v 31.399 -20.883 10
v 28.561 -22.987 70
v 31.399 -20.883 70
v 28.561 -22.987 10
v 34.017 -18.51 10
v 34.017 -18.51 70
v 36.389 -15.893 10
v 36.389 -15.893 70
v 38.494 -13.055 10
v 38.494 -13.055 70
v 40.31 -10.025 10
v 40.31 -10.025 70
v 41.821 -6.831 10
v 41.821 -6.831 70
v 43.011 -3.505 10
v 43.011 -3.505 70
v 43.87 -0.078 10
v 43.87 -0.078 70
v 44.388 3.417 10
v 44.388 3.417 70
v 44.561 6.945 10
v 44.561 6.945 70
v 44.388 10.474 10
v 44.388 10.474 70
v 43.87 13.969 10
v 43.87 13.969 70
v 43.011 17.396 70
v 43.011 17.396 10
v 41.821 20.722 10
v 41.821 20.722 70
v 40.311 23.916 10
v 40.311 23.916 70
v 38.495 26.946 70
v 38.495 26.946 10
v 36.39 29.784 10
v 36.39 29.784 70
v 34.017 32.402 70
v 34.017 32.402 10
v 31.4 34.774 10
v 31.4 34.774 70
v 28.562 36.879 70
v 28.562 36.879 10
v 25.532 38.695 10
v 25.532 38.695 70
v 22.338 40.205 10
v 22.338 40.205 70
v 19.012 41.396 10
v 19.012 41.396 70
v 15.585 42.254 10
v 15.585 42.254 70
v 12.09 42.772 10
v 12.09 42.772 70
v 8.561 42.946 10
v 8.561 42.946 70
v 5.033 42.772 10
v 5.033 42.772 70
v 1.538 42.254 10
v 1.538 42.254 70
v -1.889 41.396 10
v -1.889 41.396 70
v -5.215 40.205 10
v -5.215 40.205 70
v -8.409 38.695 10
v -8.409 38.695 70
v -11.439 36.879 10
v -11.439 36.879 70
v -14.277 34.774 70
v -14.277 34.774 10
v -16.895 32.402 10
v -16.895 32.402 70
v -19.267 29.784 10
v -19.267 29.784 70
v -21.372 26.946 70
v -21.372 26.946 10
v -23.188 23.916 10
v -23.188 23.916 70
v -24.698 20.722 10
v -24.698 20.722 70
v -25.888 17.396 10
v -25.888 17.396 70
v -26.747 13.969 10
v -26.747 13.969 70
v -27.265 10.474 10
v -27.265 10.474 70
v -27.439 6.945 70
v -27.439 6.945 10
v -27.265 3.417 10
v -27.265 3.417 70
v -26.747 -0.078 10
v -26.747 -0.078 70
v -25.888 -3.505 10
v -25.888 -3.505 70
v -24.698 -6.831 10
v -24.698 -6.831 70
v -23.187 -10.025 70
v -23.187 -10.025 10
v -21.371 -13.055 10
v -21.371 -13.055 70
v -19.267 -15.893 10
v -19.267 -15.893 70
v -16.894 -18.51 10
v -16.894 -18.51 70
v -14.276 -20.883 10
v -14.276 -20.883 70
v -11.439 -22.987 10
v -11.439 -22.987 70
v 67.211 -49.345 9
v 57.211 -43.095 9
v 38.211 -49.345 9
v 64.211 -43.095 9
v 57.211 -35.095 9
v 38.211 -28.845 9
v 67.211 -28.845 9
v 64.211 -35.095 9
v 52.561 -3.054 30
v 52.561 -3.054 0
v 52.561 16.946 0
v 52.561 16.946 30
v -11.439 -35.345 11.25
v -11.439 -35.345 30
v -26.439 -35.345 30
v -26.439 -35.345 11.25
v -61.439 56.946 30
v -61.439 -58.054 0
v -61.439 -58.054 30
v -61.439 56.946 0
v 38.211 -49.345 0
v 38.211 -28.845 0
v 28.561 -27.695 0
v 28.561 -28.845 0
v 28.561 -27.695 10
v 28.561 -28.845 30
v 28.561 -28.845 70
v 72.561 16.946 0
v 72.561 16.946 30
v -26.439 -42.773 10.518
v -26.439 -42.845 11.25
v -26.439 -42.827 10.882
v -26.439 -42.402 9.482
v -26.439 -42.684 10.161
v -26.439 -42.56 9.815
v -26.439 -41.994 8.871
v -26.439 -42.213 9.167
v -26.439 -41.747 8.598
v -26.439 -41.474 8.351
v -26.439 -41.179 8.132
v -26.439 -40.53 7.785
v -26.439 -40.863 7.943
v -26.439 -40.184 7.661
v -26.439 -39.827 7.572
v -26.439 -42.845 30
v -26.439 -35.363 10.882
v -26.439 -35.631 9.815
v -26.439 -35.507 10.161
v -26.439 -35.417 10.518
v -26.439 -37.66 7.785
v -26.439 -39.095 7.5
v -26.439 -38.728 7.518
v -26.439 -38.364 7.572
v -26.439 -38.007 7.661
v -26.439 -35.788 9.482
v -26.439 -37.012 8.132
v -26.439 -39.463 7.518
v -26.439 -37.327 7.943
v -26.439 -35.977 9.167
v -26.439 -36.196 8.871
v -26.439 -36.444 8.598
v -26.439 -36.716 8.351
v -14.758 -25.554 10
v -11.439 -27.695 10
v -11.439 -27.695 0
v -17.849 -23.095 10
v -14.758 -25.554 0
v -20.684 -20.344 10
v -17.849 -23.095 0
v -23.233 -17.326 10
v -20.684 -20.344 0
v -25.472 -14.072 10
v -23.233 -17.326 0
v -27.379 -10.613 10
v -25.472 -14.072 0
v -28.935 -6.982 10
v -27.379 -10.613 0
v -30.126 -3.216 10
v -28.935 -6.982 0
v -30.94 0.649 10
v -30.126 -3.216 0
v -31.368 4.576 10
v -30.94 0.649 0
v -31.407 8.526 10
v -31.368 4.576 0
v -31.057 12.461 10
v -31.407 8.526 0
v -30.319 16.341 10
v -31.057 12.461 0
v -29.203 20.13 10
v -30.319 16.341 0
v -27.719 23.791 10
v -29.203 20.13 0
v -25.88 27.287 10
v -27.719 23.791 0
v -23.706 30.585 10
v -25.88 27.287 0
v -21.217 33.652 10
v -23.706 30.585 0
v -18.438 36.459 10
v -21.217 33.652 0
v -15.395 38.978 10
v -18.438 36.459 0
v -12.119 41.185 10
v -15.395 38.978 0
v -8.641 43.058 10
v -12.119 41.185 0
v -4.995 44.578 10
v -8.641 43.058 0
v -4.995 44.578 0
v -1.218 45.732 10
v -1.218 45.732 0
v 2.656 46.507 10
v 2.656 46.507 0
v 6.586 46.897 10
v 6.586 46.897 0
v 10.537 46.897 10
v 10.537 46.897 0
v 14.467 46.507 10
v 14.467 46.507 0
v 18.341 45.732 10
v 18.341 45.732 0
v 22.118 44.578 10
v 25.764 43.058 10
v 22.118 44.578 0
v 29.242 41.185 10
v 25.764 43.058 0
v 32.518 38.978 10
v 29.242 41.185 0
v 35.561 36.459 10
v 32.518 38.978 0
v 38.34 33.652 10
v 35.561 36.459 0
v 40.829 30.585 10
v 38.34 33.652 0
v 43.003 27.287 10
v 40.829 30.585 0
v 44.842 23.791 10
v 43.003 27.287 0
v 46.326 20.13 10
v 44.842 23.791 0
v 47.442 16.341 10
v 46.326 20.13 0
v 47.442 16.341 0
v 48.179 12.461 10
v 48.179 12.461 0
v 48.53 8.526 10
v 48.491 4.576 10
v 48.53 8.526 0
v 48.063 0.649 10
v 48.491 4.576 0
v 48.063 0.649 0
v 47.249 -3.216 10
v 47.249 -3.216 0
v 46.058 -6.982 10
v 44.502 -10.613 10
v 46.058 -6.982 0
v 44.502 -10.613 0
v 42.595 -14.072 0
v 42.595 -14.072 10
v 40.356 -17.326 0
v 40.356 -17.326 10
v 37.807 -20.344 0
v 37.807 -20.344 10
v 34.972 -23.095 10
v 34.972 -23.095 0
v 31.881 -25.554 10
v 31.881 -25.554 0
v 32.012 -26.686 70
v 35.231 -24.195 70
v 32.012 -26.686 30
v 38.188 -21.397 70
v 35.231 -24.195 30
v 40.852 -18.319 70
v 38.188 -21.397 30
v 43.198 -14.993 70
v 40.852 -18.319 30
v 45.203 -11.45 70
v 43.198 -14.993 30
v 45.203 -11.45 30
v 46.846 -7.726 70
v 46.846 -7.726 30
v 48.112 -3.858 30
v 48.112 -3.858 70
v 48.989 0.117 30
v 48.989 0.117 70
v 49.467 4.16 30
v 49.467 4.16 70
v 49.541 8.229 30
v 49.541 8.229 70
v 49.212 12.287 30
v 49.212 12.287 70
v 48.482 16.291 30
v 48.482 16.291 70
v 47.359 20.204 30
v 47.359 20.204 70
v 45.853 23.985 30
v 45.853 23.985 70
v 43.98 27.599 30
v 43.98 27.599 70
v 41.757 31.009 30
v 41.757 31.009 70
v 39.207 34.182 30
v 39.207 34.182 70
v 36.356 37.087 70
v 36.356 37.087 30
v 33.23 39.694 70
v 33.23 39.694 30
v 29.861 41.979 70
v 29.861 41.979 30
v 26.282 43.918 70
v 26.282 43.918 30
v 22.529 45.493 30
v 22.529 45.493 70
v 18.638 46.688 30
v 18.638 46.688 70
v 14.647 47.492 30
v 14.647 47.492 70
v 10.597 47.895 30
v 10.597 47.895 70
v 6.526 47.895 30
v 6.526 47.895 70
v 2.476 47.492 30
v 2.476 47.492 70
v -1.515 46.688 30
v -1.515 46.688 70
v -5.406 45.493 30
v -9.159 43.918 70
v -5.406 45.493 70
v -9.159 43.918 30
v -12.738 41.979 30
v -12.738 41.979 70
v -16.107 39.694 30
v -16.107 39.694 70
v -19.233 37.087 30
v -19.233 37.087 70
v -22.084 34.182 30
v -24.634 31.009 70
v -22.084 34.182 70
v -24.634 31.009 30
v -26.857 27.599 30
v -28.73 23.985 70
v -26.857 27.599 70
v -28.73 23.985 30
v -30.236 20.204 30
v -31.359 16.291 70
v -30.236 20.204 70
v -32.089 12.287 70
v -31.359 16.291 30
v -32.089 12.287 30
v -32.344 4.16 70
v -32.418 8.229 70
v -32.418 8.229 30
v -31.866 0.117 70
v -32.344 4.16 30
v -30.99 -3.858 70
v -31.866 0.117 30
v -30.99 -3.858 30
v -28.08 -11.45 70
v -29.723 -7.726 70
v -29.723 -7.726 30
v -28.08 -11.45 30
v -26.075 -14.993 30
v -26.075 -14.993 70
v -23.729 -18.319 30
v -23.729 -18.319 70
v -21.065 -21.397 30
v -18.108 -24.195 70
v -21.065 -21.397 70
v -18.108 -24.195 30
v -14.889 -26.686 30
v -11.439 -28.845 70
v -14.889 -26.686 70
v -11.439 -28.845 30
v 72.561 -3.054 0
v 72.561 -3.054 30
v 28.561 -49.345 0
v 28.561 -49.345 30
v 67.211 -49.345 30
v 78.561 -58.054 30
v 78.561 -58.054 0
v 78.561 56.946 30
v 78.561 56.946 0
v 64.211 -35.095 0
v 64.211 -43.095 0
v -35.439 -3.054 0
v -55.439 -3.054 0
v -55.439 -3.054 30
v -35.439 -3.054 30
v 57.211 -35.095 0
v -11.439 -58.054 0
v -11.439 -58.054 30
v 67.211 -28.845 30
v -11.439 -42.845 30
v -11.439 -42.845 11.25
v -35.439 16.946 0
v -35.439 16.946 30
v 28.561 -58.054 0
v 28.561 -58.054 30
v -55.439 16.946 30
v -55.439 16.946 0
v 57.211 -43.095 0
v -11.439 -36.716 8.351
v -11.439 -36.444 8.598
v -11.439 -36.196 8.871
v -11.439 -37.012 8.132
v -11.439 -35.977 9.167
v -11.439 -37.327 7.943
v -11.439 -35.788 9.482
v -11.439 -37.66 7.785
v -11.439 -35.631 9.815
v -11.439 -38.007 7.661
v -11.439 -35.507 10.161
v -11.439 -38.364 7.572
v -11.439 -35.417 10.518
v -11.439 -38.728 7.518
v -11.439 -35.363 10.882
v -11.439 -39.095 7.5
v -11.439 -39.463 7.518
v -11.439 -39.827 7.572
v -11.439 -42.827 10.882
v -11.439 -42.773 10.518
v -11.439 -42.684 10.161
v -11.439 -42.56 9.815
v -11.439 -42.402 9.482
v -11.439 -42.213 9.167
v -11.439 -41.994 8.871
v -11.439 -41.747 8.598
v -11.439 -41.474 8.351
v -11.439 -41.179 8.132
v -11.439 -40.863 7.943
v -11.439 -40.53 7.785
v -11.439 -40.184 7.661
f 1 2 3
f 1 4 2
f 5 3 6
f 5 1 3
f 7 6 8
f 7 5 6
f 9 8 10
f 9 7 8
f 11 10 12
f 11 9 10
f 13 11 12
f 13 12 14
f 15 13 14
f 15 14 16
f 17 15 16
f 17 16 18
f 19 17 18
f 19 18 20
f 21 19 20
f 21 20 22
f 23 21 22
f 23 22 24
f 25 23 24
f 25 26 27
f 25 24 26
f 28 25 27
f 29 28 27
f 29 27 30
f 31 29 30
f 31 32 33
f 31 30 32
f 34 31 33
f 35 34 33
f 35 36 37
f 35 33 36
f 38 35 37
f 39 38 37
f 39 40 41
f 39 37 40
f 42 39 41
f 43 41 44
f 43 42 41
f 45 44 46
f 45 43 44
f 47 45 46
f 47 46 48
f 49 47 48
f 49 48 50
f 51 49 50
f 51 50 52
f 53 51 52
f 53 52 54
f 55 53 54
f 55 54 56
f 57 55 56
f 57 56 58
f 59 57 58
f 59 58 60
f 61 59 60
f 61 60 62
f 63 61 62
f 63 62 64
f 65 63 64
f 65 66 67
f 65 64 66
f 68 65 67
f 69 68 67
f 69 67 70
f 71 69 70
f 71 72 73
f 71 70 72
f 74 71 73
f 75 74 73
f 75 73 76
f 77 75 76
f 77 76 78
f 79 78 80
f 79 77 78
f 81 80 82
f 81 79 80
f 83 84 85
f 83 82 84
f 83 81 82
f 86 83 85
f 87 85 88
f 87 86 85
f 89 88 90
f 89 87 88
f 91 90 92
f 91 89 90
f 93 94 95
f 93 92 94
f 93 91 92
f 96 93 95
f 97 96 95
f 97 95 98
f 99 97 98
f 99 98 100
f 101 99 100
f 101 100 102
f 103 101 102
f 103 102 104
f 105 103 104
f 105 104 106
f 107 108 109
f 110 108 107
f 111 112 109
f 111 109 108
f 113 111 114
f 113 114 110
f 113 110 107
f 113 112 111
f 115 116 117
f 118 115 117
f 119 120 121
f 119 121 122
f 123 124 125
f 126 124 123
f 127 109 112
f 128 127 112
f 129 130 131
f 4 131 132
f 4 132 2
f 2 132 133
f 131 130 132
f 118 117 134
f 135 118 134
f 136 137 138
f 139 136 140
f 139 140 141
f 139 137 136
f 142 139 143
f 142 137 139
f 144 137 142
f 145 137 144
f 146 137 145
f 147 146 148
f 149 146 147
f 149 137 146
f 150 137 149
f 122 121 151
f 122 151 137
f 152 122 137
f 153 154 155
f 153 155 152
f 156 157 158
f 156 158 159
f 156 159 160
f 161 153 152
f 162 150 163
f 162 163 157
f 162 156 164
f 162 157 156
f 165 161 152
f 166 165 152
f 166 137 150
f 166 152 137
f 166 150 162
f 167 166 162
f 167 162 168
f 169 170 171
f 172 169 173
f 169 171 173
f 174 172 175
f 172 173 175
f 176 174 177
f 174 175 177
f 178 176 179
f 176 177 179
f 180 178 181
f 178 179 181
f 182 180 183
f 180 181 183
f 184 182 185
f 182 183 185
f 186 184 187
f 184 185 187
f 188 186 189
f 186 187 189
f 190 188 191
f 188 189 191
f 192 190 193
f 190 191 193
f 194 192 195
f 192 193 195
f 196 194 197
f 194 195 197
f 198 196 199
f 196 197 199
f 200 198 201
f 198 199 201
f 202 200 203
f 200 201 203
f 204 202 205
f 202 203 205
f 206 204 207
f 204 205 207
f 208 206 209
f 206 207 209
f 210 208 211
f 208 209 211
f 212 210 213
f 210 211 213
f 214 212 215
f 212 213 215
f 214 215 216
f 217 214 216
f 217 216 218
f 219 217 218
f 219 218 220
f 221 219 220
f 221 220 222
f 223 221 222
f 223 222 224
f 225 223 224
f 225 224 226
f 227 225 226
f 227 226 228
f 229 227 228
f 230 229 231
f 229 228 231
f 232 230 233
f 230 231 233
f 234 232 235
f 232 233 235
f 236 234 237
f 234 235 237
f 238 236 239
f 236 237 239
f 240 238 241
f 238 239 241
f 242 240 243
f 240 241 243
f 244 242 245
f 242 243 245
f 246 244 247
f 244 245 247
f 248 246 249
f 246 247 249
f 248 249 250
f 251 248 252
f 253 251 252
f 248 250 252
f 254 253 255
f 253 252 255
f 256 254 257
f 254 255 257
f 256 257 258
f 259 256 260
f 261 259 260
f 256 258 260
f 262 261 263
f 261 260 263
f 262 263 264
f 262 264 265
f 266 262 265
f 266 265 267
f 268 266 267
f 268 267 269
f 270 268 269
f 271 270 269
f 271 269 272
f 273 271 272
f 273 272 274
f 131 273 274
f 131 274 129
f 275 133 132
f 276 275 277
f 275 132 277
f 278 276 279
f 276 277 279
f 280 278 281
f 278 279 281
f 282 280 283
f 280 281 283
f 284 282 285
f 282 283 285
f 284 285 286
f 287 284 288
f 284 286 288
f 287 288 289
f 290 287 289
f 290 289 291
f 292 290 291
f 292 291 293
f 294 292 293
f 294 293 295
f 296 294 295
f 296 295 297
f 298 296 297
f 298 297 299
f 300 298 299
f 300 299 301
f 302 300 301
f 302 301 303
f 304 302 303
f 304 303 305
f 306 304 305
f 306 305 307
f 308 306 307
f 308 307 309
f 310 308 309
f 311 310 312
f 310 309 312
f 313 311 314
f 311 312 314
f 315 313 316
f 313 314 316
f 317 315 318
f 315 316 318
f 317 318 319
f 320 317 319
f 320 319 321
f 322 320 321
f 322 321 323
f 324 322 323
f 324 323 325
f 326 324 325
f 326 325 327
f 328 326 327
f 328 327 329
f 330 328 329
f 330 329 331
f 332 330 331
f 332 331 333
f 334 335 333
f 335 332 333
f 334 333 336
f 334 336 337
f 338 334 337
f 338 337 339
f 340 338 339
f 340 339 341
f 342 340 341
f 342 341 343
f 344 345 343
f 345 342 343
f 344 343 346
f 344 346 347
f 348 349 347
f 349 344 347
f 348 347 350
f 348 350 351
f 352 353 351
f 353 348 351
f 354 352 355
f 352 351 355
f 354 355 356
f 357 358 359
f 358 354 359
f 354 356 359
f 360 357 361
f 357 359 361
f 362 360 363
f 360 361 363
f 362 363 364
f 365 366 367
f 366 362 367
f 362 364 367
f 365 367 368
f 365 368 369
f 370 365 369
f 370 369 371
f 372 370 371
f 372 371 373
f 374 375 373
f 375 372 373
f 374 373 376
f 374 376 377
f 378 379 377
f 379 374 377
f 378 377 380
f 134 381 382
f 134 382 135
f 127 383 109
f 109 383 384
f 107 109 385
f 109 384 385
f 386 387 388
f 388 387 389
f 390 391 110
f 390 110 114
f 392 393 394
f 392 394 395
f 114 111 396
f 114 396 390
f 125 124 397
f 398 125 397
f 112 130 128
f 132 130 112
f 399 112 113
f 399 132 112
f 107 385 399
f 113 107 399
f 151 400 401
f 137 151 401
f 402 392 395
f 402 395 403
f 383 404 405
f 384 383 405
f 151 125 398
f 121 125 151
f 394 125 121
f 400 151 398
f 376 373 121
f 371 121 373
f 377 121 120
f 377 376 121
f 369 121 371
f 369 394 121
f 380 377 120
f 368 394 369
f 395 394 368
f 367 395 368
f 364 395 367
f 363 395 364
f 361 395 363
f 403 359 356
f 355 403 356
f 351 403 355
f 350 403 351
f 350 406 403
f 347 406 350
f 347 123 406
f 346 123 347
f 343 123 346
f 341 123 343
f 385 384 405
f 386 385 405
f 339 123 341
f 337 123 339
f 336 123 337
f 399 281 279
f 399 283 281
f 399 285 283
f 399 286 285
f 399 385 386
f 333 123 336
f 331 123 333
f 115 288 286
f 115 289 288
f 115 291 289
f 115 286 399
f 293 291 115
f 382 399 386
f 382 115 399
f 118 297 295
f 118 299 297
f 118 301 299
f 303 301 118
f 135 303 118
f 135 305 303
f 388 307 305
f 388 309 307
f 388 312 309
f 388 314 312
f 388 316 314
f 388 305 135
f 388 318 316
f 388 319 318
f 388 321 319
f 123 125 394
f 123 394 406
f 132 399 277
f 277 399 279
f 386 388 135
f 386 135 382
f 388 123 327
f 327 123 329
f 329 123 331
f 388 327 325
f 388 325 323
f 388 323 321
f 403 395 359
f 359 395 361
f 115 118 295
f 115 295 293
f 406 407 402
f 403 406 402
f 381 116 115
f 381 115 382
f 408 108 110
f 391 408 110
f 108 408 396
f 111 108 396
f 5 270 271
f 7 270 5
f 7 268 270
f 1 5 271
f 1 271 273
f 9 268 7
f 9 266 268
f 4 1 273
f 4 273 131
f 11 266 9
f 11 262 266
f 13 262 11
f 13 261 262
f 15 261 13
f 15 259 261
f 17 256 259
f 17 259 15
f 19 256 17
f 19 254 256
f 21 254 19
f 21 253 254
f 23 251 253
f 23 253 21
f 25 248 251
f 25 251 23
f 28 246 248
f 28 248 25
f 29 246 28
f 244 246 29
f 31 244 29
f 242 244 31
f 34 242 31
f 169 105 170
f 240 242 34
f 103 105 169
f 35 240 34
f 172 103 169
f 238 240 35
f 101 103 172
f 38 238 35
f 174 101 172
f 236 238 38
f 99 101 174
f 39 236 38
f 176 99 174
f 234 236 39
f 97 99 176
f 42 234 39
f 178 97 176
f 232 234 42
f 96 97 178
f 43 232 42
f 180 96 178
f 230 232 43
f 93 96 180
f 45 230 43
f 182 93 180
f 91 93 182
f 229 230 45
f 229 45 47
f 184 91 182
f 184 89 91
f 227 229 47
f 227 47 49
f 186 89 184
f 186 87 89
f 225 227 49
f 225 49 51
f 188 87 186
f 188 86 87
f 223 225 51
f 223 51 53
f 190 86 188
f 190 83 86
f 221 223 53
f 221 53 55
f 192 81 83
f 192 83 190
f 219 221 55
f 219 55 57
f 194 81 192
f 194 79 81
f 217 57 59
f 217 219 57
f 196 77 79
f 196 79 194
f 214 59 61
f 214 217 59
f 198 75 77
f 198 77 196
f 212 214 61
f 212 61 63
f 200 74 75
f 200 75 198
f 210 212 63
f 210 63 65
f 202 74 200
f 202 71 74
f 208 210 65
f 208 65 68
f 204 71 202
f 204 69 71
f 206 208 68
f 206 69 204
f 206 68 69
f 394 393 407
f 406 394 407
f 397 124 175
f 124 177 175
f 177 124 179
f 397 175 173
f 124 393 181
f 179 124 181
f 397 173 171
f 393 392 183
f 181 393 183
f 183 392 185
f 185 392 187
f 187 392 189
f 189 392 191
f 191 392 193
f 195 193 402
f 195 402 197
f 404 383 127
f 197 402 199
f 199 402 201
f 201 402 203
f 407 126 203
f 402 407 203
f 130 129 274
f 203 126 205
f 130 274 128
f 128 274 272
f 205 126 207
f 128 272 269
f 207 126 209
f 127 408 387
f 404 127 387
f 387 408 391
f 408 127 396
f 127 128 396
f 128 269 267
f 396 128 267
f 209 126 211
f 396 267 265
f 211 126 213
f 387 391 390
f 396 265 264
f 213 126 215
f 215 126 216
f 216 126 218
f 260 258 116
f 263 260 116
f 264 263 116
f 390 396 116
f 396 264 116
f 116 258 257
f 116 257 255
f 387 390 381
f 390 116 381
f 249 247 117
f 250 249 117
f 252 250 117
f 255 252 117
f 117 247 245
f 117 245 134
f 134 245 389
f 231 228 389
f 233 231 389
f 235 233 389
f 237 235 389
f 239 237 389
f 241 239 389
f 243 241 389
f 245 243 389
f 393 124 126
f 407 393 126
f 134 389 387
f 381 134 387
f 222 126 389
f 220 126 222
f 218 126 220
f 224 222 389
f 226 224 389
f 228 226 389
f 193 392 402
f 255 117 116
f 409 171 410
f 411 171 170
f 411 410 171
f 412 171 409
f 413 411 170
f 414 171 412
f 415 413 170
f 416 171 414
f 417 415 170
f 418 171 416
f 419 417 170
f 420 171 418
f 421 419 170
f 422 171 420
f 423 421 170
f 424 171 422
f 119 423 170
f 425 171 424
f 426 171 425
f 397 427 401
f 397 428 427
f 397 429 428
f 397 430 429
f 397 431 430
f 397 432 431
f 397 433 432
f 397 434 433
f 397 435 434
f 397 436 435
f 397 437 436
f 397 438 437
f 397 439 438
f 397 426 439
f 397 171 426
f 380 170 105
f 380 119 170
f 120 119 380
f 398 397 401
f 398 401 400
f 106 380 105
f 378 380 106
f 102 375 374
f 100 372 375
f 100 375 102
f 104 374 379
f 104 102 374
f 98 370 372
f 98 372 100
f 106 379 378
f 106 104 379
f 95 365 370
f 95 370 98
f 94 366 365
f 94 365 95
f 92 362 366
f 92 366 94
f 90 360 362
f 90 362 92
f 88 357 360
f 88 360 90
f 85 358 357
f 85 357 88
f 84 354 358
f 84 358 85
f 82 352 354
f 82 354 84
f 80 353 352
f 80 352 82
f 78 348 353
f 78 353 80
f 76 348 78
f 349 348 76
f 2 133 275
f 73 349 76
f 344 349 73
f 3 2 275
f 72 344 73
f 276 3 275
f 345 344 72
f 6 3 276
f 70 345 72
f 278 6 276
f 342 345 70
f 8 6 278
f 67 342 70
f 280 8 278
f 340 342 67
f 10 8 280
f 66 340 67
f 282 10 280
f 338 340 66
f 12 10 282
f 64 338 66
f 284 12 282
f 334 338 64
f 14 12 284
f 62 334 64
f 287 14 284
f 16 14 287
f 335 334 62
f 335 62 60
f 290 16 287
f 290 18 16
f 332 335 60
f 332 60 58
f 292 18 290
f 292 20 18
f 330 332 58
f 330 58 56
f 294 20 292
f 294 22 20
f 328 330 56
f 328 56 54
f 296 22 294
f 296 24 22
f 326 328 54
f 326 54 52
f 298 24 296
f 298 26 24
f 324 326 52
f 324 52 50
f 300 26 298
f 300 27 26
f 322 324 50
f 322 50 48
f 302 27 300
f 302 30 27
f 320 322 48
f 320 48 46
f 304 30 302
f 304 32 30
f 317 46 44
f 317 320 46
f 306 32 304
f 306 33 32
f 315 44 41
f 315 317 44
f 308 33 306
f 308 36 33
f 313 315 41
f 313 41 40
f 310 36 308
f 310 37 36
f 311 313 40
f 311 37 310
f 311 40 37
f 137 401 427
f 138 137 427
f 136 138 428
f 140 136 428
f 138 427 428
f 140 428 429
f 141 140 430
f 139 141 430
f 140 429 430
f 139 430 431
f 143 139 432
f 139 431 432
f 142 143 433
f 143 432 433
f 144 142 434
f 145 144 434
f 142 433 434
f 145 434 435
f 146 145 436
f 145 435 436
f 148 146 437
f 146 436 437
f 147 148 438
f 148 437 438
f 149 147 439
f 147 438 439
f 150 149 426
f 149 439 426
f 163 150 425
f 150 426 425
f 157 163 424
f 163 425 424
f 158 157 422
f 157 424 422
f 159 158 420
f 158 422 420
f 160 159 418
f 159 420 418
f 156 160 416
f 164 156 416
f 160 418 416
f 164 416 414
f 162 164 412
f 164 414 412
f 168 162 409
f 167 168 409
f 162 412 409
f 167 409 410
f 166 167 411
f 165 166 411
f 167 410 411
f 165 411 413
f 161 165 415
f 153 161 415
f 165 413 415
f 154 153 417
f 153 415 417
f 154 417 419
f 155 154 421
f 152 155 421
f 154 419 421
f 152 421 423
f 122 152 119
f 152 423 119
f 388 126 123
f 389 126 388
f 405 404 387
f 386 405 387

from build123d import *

# Parameters (mm, degrees)
SKETCH_1_W          = 140
SKETCH_1_H          = 115
SKETCH_1_R          = 36
SKETCH_1_W_2        = 20
SKETCH_1_H_2        = 20
EXTRUDE_1_DEPTH     = 30
SKETCH_2_R          = 40
CUT_EXTRUDE_1_DEPTH = 10
SKETCH_10_R         = 41
SKETCH_10_R_2       = 36
EXTRUDE_3_DEPTH     = 40
CUT_EXTRUDE_2_REACH = 117
SKETCH_3_W          = 40
SKETCH_3_H          = 80
SKETCH_4_R          = 3.75
SKETCH_4_W          = 18.75
SKETCH_4_H          = 7.5
CUT_EXTRUDE_3_DEPTH = 15
SKETCH_6_W          = 9.65
SKETCH_6_H          = 20.5
CUT_EXTRUDE_4_DEPTH = 31
SKETCH_7_W          = 29
SKETCH_7_H          = 20.5
CUT_EXTRUDE_5_DEPTH = 21
SKETCH_11_W         = 7
SKETCH_11_H         = 8
CUT_EXTRUDE_6_DEPTH = 10


with BuildPart() as part:
    # 草圖1 → 填料-伸長1 (new body)
    with BuildSketch(Plane.XY):
        with Locations((8.56146046, -0.554151625)):
            Rectangle(SKETCH_1_W, SKETCH_1_H)
        with Locations((8.56146046, 6.945848375)):
            Circle(SKETCH_1_R, mode=Mode.SUBTRACT)
        with Locations((-45.43853954, 6.945848375)):
            Rectangle(SKETCH_1_W_2, SKETCH_1_H_2, mode=Mode.SUBTRACT)
        with Locations((62.56146046, 6.945848375)):
            Rectangle(SKETCH_1_W_2, SKETCH_1_H_2, mode=Mode.SUBTRACT)
    extrude(amount=EXTRUDE_1_DEPTH)

    # 草圖2 → 除料-伸長1 (cut)
    with BuildSketch(Plane(origin=(0, 0, 0), x_dir=(-1, 0, 0), z_dir=(0, 0, -1))):
        with Locations((-8.56146046, 6.945848375)):
            Circle(SKETCH_2_R)
    extrude(amount=-CUT_EXTRUDE_1_DEPTH, mode=Mode.SUBTRACT)

    # 草圖10 → 填料-伸長3 (add)
    with BuildSketch(Plane.XY.offset(30)):
        with Locations((8.56146046, 6.945848375)):
            Circle(SKETCH_10_R)
        with Locations((8.56146046, 6.945848375)):
            Circle(SKETCH_10_R_2, mode=Mode.SUBTRACT)
    extrude(amount=EXTRUDE_3_DEPTH)

    # 草圖3 → 除料-伸長2 (cut, up to next)
    with BuildSketch(Plane.XZ.offset(58.054151625), mode=Mode.PRIVATE) as cut_extrude_2_sk1:
        with Locations((8.56146046, 40)):
            Rectangle(SKETCH_3_W, SKETCH_3_H)
    cut_extrude_2_tool1 = extrude(cut_extrude_2_sk1.sketch, amount=-CUT_EXTRUDE_2_REACH, mode=Mode.PRIVATE) & part.part
    add(cut_extrude_2_tool1.solids().sort_by_distance((8.56146, -58.054152, 40))[0], mode=Mode.SUBTRACT)

    # 草圖4 → 除料-伸長3 (cut)
    with BuildSketch(Plane(origin=(-11.43853954, 0, 0), x_dir=(0, 0, -1), z_dir=(1, 0, 0))):
        with Locations((-11.25, -39.095211961)):
            Circle(SKETCH_4_R)
        with Locations((-20.625, -39.095211961)):
            Rectangle(SKETCH_4_W, SKETCH_4_H)
    extrude(amount=-CUT_EXTRUDE_3_DEPTH, mode=Mode.SUBTRACT)

    # 草圖6 → 除料-伸長4 (cut, through all)
    with BuildSketch(Plane.XY.offset(30)):
        with Locations((33.38646046, -39.095211961)):
            Rectangle(SKETCH_6_W, SKETCH_6_H)
    extrude(amount=-CUT_EXTRUDE_4_DEPTH, mode=Mode.SUBTRACT)

    # 草圖7 → 除料-伸長5 (cut)
    with BuildSketch(Plane.XY.offset(30)):
        with Locations((52.71146046, -39.095211961)):
            Rectangle(SKETCH_7_W, SKETCH_7_H)
    extrude(amount=-CUT_EXTRUDE_5_DEPTH, mode=Mode.SUBTRACT)

    # 草圖11 → 除料-伸長6 (cut)
    with BuildSketch(Plane.XY.offset(9)):
        with Locations((60.71146046, -39.095211961)):
            Rectangle(SKETCH_11_W, SKETCH_11_H)
    extrude(amount=-CUT_EXTRUDE_6_DEPTH, mode=Mode.SUBTRACT)


solid = part.part
